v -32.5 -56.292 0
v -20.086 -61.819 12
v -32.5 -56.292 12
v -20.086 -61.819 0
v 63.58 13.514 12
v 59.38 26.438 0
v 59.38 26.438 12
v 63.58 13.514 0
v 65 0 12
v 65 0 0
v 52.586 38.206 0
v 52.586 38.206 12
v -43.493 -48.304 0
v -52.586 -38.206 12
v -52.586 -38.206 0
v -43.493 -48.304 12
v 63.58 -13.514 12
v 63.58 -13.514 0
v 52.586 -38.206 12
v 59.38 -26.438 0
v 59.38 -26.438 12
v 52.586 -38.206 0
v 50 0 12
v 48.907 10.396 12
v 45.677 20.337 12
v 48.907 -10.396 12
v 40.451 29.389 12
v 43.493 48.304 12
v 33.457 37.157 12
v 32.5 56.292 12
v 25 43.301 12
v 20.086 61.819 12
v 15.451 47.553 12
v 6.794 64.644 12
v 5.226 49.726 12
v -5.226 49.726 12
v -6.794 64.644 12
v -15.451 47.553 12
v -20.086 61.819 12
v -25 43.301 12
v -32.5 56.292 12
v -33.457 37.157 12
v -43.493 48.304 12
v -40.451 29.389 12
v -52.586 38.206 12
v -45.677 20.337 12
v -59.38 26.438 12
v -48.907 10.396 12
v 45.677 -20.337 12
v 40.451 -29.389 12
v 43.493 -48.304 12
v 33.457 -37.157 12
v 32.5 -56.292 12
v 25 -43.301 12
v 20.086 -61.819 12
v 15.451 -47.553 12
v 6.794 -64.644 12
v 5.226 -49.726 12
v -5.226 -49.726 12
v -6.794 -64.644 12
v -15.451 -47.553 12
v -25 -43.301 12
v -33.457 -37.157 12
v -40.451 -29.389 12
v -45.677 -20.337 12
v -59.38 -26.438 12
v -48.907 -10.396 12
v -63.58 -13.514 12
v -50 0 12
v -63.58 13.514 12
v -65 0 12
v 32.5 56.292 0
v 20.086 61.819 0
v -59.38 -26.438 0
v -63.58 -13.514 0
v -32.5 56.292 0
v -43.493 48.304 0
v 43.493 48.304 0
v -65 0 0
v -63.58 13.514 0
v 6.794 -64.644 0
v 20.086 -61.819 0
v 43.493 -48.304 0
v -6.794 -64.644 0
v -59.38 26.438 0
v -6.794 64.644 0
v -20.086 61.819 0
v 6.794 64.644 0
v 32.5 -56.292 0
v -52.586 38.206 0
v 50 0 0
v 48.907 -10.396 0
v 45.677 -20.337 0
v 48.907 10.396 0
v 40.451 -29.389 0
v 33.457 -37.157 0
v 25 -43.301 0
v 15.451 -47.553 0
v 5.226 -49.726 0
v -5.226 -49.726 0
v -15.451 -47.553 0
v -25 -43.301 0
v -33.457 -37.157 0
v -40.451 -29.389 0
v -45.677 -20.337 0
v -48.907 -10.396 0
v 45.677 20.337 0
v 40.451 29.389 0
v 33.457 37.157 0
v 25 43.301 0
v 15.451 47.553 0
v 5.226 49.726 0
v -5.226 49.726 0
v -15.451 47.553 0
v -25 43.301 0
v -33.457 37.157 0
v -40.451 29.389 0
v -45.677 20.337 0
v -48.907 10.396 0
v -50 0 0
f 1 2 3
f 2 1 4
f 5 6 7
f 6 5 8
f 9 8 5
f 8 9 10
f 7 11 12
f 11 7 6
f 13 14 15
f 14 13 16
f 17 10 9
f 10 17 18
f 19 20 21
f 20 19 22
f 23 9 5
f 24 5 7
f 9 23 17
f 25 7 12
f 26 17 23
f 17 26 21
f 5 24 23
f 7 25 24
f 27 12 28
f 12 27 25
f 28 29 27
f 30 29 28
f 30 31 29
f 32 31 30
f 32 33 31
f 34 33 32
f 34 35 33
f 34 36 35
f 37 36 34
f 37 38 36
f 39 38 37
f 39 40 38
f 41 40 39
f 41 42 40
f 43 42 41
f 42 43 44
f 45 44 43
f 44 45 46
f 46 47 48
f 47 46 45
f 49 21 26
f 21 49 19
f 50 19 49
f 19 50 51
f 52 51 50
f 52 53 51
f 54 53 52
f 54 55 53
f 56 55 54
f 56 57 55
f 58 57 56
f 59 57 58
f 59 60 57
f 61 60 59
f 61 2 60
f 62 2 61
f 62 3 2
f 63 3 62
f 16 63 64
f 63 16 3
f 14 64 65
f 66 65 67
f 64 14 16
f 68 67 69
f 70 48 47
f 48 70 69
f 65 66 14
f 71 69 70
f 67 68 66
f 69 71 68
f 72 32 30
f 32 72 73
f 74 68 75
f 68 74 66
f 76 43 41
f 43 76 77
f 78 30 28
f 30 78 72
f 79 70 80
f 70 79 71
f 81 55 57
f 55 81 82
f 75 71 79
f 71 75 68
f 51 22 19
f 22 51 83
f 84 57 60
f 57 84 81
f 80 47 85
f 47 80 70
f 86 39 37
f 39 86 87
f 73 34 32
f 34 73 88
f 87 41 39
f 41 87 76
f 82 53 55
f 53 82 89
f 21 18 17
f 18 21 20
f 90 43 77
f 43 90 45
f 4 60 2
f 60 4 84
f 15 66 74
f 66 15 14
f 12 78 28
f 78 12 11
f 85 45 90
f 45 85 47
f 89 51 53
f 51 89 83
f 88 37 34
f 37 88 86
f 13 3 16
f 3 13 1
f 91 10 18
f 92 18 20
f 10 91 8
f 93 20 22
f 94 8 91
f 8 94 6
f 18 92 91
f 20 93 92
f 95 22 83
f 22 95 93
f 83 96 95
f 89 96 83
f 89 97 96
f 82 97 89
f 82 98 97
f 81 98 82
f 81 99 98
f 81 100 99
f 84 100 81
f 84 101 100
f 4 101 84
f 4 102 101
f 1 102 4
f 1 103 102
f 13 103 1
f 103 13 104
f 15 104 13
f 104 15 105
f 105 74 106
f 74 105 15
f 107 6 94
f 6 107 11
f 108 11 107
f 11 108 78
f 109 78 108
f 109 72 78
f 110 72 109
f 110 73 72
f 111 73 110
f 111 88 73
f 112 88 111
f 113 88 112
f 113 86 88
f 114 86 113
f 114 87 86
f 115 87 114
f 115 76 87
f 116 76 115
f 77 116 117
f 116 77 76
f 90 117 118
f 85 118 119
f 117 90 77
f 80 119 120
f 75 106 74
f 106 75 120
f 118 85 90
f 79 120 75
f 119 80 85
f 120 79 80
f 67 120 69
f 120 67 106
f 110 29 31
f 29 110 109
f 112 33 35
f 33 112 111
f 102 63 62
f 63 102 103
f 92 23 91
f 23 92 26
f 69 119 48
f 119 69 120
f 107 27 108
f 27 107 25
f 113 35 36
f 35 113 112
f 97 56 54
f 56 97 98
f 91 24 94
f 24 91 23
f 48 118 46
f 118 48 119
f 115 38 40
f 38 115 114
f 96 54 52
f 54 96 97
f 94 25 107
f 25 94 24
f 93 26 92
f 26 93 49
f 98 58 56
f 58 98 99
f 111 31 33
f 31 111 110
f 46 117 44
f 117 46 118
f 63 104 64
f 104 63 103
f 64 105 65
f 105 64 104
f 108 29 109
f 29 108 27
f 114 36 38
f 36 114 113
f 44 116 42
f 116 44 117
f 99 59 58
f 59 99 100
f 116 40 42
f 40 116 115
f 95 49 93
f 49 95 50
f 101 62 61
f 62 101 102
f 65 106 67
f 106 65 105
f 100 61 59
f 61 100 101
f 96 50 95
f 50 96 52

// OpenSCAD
height=12;
inner=100;
outter=130;

difference(){
    cylinder(h=height, d=outter);
    cylinder(h=height, d=inner);
}


/*
difference(){
    translate([40.3, 0, 0])
    cylinder(h=height, d=poleOuter);
    translate([40.3, 0, 2])
    cylinder(h=height, d=poleInner);
}

translate([4.1, -4, 0])
cube([32, 8, height]);
*/
